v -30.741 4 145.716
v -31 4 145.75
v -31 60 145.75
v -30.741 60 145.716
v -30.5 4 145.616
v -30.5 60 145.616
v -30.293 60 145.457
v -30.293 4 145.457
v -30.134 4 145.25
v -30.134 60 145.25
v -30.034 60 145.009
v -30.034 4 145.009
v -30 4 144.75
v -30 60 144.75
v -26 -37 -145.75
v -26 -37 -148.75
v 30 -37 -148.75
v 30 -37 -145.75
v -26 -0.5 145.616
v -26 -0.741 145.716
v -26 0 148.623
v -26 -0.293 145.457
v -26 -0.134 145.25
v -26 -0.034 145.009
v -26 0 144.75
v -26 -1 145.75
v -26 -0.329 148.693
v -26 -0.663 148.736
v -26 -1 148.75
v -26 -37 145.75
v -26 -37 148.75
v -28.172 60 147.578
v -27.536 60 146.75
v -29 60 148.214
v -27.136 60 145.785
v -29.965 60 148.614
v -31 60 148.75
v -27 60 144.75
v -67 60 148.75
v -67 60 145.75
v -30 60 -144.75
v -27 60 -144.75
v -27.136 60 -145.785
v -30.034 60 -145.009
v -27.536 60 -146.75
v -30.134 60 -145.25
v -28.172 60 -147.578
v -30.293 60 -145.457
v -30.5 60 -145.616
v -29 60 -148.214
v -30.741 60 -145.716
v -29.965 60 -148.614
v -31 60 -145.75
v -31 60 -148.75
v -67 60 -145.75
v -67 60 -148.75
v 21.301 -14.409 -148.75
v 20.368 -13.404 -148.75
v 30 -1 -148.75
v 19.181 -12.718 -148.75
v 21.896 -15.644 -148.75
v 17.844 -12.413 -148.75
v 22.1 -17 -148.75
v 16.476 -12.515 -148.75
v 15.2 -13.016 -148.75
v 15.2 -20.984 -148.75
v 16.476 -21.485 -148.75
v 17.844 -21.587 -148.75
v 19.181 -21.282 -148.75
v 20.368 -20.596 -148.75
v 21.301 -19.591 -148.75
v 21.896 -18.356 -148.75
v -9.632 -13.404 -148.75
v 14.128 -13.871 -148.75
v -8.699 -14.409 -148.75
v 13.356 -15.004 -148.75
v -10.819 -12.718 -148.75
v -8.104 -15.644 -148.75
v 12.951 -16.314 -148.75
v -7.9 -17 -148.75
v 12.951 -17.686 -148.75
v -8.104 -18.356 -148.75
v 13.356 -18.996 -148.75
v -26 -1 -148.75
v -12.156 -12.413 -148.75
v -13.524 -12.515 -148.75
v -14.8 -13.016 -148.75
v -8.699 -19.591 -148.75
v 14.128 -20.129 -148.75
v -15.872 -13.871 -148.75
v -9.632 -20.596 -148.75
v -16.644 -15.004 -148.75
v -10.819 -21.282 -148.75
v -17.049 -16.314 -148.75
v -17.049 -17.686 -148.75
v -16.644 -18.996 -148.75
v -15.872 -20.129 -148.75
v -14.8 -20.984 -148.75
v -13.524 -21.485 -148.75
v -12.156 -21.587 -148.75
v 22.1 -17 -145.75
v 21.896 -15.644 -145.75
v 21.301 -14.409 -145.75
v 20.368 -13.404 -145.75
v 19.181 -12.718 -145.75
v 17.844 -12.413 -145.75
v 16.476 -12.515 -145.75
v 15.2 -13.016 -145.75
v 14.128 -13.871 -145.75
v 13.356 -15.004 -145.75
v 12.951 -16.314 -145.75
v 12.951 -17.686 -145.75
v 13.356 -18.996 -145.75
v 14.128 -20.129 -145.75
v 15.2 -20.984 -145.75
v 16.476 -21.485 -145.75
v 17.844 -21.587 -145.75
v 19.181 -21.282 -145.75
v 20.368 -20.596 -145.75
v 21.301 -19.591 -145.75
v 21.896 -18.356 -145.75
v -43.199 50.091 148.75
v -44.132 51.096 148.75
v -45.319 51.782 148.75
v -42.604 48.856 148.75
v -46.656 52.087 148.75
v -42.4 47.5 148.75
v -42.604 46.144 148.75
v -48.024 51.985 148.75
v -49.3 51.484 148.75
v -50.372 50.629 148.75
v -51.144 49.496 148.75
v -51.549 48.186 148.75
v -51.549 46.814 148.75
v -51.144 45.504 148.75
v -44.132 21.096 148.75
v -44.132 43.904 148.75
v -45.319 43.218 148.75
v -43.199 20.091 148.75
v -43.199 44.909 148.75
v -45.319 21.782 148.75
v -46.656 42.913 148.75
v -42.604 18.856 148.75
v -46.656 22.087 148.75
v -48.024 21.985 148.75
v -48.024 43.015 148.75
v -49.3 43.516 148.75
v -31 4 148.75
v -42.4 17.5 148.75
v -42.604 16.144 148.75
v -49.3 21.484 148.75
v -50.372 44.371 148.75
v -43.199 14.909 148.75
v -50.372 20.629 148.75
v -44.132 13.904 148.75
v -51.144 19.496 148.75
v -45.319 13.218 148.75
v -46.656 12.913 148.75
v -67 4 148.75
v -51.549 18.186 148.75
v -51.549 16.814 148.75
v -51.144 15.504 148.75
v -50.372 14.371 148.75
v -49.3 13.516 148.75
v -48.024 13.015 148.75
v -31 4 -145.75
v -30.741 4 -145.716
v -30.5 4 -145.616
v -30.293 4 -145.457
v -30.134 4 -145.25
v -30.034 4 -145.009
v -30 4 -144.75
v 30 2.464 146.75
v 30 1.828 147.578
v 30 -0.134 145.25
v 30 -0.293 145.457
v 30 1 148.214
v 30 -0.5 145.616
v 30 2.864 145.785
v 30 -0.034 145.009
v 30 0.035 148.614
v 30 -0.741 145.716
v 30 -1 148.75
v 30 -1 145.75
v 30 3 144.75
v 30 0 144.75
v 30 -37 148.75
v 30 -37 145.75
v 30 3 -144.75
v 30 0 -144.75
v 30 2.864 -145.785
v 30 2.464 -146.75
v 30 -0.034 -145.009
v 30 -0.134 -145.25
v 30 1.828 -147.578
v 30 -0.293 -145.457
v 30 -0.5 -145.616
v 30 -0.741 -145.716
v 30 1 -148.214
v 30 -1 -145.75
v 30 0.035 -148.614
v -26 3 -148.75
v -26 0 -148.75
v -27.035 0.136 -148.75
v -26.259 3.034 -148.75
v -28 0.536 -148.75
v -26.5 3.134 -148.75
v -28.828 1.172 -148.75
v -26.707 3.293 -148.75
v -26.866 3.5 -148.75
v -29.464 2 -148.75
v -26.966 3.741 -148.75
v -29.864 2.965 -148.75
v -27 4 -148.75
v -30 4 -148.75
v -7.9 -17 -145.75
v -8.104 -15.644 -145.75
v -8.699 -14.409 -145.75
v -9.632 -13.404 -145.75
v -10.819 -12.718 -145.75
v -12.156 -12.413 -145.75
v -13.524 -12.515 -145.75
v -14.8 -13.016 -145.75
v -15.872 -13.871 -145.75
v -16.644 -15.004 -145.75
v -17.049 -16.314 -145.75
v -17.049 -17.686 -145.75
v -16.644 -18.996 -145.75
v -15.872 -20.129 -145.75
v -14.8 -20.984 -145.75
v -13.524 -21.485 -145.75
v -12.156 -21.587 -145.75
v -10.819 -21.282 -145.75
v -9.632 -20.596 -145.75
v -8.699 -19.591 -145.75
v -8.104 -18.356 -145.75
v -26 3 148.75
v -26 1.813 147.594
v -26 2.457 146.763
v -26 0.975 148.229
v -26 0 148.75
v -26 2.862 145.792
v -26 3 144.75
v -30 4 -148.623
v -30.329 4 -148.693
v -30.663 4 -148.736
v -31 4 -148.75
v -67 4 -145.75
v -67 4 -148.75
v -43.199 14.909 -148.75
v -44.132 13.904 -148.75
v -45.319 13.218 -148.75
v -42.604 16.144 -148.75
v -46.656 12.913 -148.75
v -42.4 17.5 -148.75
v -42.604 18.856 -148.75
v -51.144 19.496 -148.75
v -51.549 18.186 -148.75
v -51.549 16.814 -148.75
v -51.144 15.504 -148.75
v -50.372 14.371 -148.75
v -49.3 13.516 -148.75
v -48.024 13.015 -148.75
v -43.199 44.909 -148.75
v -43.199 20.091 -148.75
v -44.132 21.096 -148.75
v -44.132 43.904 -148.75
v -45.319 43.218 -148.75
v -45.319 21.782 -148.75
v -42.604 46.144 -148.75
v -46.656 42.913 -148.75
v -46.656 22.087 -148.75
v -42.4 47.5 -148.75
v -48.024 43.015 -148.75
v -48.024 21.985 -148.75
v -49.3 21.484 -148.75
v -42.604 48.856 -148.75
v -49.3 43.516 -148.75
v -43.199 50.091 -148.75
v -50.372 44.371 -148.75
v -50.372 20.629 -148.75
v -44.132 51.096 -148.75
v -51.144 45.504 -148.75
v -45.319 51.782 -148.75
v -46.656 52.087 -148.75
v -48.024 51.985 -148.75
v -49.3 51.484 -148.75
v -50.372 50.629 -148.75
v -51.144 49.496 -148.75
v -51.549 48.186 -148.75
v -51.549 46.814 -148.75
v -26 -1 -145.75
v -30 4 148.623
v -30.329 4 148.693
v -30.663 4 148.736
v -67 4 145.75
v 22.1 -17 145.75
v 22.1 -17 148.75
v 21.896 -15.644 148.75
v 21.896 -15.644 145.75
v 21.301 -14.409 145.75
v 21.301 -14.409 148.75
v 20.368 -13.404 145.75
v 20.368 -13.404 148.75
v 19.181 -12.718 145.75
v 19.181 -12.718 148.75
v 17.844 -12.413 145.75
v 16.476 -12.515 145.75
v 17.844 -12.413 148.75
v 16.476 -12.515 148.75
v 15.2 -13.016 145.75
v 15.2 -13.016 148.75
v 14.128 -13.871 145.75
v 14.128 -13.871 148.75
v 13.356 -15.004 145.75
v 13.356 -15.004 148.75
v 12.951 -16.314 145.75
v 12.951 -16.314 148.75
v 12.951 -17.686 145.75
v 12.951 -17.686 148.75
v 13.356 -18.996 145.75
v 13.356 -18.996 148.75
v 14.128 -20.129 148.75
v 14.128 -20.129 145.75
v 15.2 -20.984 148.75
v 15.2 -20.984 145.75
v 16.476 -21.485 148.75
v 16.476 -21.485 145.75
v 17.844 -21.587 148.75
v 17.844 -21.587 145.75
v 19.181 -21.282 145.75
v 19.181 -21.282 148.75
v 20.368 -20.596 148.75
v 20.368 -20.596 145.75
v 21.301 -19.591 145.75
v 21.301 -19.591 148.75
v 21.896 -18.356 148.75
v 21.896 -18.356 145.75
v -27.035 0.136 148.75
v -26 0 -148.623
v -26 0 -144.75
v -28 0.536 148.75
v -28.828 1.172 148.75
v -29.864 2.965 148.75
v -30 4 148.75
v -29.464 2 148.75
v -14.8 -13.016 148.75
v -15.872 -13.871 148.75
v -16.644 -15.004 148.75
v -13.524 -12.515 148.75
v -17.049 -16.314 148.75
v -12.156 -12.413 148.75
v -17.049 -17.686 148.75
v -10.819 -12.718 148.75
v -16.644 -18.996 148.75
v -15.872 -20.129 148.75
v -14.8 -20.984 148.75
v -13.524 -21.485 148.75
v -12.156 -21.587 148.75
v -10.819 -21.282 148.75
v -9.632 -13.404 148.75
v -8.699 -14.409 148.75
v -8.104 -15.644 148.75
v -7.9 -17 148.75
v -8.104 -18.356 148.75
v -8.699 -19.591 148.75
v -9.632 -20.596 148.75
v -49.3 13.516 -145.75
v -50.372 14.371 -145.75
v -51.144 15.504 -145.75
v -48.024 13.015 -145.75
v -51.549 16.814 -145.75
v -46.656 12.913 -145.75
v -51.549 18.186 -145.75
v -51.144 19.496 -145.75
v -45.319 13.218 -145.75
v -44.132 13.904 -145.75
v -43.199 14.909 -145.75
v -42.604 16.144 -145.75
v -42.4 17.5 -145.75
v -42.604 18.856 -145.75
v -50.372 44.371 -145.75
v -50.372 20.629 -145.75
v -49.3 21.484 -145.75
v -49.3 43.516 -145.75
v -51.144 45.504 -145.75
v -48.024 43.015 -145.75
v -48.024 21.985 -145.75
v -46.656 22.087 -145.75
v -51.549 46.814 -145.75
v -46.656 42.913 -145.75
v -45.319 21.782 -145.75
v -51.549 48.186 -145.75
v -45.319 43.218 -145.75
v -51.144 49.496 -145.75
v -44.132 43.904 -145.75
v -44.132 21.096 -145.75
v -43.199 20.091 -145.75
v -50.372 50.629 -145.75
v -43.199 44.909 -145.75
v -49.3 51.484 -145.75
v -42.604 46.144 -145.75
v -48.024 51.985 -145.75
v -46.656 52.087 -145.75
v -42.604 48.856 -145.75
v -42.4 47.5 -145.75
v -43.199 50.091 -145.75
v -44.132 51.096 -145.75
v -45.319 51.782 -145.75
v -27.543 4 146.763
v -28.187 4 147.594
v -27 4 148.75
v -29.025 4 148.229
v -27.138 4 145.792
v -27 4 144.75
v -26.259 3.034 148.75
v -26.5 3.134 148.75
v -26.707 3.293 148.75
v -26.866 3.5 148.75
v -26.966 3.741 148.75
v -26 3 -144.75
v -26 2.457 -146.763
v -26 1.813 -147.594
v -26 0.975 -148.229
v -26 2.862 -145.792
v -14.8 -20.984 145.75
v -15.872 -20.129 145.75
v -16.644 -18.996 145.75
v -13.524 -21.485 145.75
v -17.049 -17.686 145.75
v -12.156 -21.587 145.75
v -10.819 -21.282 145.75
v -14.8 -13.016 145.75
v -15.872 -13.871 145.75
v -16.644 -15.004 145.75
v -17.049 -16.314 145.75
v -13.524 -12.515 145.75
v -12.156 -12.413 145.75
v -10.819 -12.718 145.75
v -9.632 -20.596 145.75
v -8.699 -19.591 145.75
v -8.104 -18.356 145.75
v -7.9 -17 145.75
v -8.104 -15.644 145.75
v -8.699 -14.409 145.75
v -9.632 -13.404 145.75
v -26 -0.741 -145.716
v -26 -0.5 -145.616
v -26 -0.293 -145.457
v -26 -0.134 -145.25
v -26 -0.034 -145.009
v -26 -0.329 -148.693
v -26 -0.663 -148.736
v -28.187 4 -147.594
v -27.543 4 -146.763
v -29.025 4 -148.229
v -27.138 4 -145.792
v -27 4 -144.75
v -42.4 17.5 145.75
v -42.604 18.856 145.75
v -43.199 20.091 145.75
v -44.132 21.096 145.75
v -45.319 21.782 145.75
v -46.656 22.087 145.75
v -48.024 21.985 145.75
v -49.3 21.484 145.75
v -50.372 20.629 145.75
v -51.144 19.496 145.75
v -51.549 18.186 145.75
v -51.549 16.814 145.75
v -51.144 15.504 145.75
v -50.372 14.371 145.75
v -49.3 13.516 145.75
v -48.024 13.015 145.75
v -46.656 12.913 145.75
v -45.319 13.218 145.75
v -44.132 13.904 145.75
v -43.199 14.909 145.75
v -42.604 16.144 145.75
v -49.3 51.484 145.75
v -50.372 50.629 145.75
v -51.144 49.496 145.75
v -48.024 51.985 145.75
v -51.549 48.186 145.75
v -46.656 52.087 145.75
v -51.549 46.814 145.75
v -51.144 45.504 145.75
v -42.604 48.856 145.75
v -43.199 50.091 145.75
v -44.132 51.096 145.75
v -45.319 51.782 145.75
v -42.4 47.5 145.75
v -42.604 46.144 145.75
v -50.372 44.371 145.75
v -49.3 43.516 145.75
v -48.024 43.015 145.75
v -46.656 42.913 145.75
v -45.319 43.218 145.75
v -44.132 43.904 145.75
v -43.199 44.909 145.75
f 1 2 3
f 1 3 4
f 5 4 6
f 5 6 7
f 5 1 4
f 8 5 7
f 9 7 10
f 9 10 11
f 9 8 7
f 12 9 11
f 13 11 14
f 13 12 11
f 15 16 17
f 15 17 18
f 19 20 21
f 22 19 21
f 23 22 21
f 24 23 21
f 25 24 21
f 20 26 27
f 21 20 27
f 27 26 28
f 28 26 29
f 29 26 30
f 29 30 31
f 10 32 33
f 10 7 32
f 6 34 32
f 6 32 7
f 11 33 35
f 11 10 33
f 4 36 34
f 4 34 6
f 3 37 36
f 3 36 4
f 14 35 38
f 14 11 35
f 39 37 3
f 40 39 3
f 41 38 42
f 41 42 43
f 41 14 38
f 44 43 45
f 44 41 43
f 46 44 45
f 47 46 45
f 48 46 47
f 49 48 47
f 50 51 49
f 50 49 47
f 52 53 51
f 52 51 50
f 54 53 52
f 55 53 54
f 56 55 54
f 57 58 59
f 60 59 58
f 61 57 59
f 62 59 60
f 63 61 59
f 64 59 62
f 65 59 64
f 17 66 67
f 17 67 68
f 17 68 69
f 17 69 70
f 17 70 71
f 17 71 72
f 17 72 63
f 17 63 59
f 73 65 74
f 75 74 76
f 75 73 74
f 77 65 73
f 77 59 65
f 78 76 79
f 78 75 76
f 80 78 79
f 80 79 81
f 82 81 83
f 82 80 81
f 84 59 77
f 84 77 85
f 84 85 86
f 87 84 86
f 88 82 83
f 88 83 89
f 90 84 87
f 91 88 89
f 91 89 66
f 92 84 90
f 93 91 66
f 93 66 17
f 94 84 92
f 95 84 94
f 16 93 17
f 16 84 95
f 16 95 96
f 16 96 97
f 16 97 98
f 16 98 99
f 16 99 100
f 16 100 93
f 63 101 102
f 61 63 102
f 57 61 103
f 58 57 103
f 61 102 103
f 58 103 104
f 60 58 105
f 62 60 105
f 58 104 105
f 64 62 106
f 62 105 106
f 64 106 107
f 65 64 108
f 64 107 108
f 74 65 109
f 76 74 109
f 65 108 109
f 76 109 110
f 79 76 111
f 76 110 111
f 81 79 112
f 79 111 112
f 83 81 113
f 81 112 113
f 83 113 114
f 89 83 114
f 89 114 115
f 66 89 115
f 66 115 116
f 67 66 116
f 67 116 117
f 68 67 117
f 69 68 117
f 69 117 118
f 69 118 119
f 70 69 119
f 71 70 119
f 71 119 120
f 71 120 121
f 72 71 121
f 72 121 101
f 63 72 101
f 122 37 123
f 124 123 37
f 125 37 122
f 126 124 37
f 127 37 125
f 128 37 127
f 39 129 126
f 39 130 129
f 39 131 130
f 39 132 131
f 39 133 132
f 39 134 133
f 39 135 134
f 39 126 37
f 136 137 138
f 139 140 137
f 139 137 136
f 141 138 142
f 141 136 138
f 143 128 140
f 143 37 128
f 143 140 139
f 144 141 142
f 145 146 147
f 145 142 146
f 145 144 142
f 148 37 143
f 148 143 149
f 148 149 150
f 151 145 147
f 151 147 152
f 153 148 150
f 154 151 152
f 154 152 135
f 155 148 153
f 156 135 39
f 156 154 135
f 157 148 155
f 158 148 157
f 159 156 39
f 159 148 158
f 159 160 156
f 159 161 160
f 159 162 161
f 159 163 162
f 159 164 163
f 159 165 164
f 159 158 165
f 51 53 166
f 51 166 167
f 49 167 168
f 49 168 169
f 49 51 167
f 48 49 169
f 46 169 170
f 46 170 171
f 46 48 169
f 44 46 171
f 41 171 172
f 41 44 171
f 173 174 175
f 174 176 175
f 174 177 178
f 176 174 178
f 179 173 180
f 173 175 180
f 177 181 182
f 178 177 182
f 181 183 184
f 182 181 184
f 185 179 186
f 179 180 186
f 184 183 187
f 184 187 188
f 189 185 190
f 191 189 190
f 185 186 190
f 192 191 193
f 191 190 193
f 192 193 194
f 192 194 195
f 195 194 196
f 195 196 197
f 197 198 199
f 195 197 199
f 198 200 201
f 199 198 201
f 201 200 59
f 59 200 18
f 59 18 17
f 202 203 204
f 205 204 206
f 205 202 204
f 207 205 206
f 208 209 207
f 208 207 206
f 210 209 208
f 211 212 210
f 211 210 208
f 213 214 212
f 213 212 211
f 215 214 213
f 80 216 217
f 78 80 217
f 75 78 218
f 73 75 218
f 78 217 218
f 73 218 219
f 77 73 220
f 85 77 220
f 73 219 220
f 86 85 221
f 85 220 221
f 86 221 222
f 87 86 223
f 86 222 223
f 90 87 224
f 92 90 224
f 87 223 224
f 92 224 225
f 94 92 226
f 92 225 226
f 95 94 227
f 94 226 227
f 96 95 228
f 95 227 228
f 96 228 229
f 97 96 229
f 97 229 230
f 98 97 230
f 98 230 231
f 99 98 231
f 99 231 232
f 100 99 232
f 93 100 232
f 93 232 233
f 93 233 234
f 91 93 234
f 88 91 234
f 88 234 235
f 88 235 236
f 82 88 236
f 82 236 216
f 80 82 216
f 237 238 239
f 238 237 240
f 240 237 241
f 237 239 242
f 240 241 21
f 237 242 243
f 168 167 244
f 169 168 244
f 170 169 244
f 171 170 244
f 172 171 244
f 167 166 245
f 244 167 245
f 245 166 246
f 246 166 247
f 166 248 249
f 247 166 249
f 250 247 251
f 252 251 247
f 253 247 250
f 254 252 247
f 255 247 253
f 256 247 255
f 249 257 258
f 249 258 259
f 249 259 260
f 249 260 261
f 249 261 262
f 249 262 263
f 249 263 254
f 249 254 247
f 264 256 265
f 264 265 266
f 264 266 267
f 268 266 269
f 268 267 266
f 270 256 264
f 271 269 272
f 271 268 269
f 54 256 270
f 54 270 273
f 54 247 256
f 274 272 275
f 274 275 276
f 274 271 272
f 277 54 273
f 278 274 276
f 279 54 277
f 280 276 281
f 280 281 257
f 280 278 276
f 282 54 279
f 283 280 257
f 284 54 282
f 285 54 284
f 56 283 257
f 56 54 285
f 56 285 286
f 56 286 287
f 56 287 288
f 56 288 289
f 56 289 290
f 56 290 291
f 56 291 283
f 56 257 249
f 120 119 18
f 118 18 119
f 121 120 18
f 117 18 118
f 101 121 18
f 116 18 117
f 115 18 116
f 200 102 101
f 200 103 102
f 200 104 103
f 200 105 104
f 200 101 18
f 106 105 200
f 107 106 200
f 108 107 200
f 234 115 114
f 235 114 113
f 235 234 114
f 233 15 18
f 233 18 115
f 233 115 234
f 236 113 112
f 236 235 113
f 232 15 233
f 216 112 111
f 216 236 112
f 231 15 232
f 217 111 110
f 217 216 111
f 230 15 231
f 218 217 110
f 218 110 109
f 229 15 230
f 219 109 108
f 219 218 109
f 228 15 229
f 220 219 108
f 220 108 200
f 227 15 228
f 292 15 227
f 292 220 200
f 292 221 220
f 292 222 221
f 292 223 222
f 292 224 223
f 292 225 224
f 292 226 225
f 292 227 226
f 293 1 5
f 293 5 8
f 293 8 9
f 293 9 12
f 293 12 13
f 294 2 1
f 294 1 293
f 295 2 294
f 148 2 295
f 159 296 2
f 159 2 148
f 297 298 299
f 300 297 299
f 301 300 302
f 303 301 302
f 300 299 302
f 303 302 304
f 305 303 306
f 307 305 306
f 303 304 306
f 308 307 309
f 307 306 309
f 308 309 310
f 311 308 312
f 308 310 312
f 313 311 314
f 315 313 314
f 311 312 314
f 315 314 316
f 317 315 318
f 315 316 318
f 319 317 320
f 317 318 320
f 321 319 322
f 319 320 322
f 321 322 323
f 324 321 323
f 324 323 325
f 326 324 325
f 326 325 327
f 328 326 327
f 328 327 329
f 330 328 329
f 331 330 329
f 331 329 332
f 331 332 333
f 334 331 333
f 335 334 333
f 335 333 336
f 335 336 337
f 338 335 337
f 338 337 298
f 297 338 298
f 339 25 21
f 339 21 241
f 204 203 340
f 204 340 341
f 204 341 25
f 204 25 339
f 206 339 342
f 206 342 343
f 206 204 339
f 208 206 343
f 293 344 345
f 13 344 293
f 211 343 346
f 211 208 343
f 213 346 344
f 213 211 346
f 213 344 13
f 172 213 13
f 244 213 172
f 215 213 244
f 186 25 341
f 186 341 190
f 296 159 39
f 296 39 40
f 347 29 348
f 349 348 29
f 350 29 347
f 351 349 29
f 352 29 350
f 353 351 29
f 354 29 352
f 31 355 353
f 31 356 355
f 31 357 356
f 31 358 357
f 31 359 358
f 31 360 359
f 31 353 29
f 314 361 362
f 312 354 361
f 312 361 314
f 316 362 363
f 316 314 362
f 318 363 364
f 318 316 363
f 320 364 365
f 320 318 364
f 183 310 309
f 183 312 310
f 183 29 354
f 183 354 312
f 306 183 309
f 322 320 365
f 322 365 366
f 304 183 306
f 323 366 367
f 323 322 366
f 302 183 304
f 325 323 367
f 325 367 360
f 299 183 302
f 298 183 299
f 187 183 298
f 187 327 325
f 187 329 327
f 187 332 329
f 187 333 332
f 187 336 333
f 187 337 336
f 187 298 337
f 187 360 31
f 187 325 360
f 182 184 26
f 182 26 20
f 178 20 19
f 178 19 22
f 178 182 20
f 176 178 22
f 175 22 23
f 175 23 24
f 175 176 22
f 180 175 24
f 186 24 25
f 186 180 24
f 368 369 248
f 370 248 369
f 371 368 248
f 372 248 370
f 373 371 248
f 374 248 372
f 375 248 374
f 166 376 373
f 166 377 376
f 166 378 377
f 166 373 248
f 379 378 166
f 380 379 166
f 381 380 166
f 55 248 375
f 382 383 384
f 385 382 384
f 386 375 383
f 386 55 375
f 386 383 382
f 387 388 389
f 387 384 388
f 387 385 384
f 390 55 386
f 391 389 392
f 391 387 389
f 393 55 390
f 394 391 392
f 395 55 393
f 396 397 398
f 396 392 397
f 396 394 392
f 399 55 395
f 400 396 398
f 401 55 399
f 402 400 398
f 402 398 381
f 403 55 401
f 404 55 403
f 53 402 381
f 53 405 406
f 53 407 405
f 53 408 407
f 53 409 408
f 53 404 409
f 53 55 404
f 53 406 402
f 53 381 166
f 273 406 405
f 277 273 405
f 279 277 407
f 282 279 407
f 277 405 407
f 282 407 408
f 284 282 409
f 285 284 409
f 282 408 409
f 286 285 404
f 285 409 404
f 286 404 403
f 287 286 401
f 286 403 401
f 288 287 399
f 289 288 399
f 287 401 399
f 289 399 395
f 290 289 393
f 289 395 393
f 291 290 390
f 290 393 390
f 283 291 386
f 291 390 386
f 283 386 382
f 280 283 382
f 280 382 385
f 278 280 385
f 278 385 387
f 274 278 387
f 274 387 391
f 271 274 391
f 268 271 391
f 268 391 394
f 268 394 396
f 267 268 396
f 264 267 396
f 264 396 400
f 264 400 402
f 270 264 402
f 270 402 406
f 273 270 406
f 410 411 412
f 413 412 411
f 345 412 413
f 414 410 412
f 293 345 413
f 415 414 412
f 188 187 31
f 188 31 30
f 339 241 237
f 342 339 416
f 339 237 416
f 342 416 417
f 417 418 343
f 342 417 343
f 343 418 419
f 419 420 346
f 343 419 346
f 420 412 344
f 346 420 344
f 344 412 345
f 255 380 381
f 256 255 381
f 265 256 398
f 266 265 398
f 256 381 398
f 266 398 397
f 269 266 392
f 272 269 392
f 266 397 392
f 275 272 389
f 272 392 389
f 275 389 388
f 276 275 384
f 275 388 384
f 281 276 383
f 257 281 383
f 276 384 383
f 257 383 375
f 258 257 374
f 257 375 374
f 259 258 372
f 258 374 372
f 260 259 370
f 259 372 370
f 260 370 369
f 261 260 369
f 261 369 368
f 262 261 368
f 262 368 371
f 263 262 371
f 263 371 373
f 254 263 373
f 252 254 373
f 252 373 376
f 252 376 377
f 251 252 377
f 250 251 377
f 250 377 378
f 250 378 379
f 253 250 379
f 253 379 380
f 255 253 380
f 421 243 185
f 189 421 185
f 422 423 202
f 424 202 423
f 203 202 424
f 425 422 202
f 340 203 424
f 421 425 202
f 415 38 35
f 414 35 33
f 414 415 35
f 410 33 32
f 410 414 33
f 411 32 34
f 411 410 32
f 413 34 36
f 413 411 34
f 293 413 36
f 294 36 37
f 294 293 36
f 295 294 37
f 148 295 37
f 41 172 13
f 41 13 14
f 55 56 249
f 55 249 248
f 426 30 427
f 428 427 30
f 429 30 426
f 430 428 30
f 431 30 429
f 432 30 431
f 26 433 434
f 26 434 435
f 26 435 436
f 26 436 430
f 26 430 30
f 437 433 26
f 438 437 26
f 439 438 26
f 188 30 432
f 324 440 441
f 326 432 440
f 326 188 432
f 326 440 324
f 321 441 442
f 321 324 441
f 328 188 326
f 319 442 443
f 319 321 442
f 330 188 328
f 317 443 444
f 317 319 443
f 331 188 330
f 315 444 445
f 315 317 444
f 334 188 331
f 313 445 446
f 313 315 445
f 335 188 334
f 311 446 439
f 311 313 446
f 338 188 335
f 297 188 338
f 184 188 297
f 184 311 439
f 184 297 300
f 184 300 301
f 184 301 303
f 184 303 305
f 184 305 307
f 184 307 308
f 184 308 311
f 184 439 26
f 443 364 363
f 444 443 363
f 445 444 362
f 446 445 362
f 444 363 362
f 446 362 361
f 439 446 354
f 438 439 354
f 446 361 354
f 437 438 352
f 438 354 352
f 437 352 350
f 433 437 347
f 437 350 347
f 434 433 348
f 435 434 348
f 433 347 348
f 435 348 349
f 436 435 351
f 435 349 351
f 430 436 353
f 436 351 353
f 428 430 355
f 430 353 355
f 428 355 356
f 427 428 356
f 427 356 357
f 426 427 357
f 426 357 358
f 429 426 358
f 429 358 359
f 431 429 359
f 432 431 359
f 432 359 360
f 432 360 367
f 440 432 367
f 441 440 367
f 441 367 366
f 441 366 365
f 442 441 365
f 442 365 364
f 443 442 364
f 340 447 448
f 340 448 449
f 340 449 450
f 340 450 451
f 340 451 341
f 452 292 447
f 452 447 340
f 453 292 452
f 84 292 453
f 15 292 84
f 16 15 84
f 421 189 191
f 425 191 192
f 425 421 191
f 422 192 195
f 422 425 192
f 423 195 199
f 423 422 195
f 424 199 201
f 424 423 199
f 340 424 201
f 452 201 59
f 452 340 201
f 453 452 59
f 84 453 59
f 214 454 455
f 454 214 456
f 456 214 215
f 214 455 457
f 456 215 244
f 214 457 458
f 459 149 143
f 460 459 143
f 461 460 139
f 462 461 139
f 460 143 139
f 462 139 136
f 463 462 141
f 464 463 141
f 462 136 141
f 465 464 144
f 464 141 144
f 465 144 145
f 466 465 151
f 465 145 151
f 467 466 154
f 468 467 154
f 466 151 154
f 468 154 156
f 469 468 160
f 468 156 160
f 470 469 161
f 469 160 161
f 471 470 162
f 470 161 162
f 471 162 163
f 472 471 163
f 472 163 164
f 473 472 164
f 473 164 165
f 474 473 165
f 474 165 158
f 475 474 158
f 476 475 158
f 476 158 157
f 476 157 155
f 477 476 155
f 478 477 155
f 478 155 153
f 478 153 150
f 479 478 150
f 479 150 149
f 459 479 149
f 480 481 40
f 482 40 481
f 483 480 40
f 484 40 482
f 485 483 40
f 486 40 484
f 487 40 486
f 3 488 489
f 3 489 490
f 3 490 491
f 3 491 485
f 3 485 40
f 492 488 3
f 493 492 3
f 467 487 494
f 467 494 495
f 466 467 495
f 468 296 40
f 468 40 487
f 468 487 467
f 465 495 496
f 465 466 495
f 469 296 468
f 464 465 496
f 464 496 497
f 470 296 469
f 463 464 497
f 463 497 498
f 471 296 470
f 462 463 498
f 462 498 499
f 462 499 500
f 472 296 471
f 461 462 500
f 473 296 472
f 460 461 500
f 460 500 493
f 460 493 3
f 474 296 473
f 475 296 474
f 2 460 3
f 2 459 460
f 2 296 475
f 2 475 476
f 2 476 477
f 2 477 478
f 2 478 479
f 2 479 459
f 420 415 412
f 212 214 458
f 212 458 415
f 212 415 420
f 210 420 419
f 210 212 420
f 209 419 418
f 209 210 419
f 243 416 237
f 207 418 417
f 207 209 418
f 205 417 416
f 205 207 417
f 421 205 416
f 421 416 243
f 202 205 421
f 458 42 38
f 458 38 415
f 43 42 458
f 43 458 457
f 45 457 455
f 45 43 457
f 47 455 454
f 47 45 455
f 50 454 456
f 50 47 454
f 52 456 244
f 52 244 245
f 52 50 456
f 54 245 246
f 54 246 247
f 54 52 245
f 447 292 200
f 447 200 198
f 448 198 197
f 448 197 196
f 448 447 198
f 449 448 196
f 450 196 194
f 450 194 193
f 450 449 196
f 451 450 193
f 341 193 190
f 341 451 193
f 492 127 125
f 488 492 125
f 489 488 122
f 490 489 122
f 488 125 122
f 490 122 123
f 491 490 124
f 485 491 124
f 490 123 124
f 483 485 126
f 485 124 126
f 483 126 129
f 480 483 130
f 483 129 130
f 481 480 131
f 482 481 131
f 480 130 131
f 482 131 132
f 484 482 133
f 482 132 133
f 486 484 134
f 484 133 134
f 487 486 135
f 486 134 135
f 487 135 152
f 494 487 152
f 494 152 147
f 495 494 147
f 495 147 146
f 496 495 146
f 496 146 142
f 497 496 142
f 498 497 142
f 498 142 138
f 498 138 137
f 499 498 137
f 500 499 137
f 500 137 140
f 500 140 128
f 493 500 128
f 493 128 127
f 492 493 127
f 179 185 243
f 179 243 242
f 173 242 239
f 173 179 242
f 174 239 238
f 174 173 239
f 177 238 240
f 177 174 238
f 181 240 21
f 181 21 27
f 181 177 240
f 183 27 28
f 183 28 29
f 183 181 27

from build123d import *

# Parameters (mm, degrees)
SKETCH1_W                      = 60
SKETCH1_H                      = 297.5
BASE_FLANGE1_DEPTH             = 3
EDGE_FLANGE1_STRIP_W           = 14
EDGE_FLANGE1_STRIP_H           = 3
EDGE_FLANGE1_STRIP_CUT_DEPTH   = 297.5
EDGE_FLANGE1_DEPTH             = 297.5
EDGE_FLANGE2_STRIP_W           = 14
EDGE_FLANGE2_STRIP_H           = 3
EDGE_FLANGE2_STRIP_CUT_DEPTH   = 56
EDGE_FLANGE2_STRIP_2_W         = 14
EDGE_FLANGE2_STRIP_2_H         = 3
EDGE_FLANGE2_STRIP_CUT_2_DEPTH = 56
EDGE_FLANGE2_STRIP_3_W         = 14
EDGE_FLANGE2_STRIP_3_H         = 3
EDGE_FLANGE2_STRIP_CUT_3_DEPTH = 56
EDGE_FLANGE2_STRIP_4_W         = 14
EDGE_FLANGE2_STRIP_4_H         = 3
EDGE_FLANGE2_STRIP_CUT_4_DEPTH = 56
EDGE_FLANGE2_DEPTH             = 56
EDGE_FLANGE2_BEND_DEPTH        = 56
EDGE_FLANGE2_BEND_2_DEPTH      = 56
EDGE_FLANGE2_BEND_3_DEPTH      = 56
SKETCH18_R                     = 4.6
EXTRUDE1_DEPTH                 = 311.797763827


# Sheet-metal steps are written as plain solids
with BuildPart() as part:
    # Sketch1 → Base-Flange1 (new body)
    with BuildSketch(Plane(origin=(0, 0, 0), x_dir=(1, 0, 0), z_dir=(0, 1, 0))):
        Rectangle(SKETCH1_W, SKETCH1_H)
    extrude(amount=BASE_FLANGE1_DEPTH)

    # Edge-Flange1 strip (across the edge) → Edge-Flange1 strip cut (cut)
    with BuildSketch(Plane(origin=(-30, 3, -148.75), x_dir=(1, 0, 0), z_dir=(0, 0, 1))):
        with Locations((-3, -1.5)):
            Rectangle(EDGE_FLANGE1_STRIP_W, EDGE_FLANGE1_STRIP_H)
    extrude(amount=EDGE_FLANGE1_STRIP_CUT_DEPTH, mode=Mode.SUBTRACT)

    # Edge-Flange1 section (across the edge) → Edge-Flange1 (add)
    with BuildSketch(Plane(origin=(-30, 3, -148.75), x_dir=(1, 0, 0), z_dir=(0, 0, 1))):
        with BuildLine():
            Line((0, 1), (0, 57))
            Line((0, 57), (3, 57))
            Line((3, 57), (3, 1))
            ThreePointArc((3, 1), (3.292893219, 0.292893219), (4, 0))
            Line((4, 0), (4, -3))
            ThreePointArc((4, -3), (1.171572875, -1.828427125), (0, 1))
        make_face()
    extrude(amount=EDGE_FLANGE1_DEPTH)

    # Edge-Flange2 strip (across the edge) → Edge-Flange2 strip cut (cut)
    with BuildSketch(Plane(origin=(-30, 4, 148.75), x_dir=(0, 0, -1), z_dir=(0, 1, 0))):
        with Locations((-3, -1.5)):
            Rectangle(EDGE_FLANGE2_STRIP_W, EDGE_FLANGE2_STRIP_H)
    extrude(amount=EDGE_FLANGE2_STRIP_CUT_DEPTH, mode=Mode.SUBTRACT)

    # Edge-Flange2 strip 2 (across the edge) → Edge-Flange2 strip cut 2 (cut)
    with BuildSketch(Plane(origin=(30, 0, 148.75), x_dir=(0, 0, -1), z_dir=(-1, 0, 0))):
        with Locations((-3, -1.5)):
            Rectangle(EDGE_FLANGE2_STRIP_2_W, EDGE_FLANGE2_STRIP_2_H)
    extrude(amount=EDGE_FLANGE2_STRIP_CUT_2_DEPTH, mode=Mode.SUBTRACT)

    # Edge-Flange2 strip 3 (across the edge) → Edge-Flange2 strip cut 3 (cut)
    with BuildSketch(Plane(origin=(-30, 60, -148.75), x_dir=(0, 0, 1), z_dir=(0, -1, 0))):
        with Locations((-3, -1.5)):
            Rectangle(EDGE_FLANGE2_STRIP_3_W, EDGE_FLANGE2_STRIP_3_H)
    extrude(amount=EDGE_FLANGE2_STRIP_CUT_3_DEPTH, mode=Mode.SUBTRACT)

    # Edge-Flange2 strip 4 (across the edge) → Edge-Flange2 strip cut 4 (cut)
    with BuildSketch(Plane(origin=(-26, 0, -148.75), x_dir=(0, 0, 1), z_dir=(1, 0, 0))):
        with Locations((-3, -1.5)):
            Rectangle(EDGE_FLANGE2_STRIP_4_W, EDGE_FLANGE2_STRIP_4_H)
    extrude(amount=EDGE_FLANGE2_STRIP_CUT_4_DEPTH, mode=Mode.SUBTRACT)

    # Edge-Flange2 section (across the edge) → Edge-Flange2 (add)
    with BuildSketch(Plane(origin=(-30, 4, 148.75), x_dir=(0, 0, -1), z_dir=(0, 1, 0))):
        with BuildLine():
            Line((0, 1), (0, 37))
            Line((0, 37), (3, 37))
            Line((3, 37), (3, 1))
            ThreePointArc((3, 1), (3.292893219, 0.292893219), (4, 0))
            Line((4, 0), (4, -3))
            ThreePointArc((4, -3), (1.171572875, -1.828427125), (0, 1))
        make_face()
    extrude(amount=EDGE_FLANGE2_DEPTH)

    # Edge-Flange2 section 2 (across the edge) → Edge-Flange2 bend (add)
    with BuildSketch(Plane(origin=(30, 0, 148.75), x_dir=(0, 0, -1), z_dir=(-1, 0, 0))):
        with BuildLine():
            Line((0, 1), (0, 37))
            Line((0, 37), (3, 37))
            Line((3, 37), (3, 1))
            ThreePointArc((3, 1), (3.292893219, 0.292893219), (4, 0))
            Line((4, 0), (4, -3))
            ThreePointArc((4, -3), (1.171572875, -1.828427125), (0, 1))
        make_face()
    extrude(amount=EDGE_FLANGE2_BEND_DEPTH)

    # Edge-Flange2 section 3 (across the edge) → Edge-Flange2 bend 2 (add)
    with BuildSketch(Plane(origin=(-30, 60, -148.75), x_dir=(0, 0, 1), z_dir=(0, -1, 0))):
        with BuildLine():
            Line((0, 1), (0, 37))
            Line((0, 37), (3, 37))
            Line((3, 37), (3, 1))
            ThreePointArc((3, 1), (3.292893219, 0.292893219), (4, 0))
            Line((4, 0), (4, -3))
            ThreePointArc((4, -3), (1.171572875, -1.828427125), (0, 1))
        make_face()
    extrude(amount=EDGE_FLANGE2_BEND_2_DEPTH)

    # Edge-Flange2 section 4 (across the edge) → Edge-Flange2 bend 3 (add)
    with BuildSketch(Plane(origin=(-26, 0, -148.75), x_dir=(0, 0, 1), z_dir=(1, 0, 0))):
        with BuildLine():
            Line((0, 1), (0, 37))
            Line((0, 37), (3, 37))
            Line((3, 37), (3, 1))
            ThreePointArc((3, 1), (3.292893219, 0.292893219), (4, 0))
            Line((4, 0), (4, -3))
            ThreePointArc((4, -3), (1.171572875, -1.828427125), (0, 1))
        make_face()
    extrude(amount=EDGE_FLANGE2_BEND_3_DEPTH)

    # Sketch18 → Extrude1 (cut, through all)
    with BuildSketch(Plane.XY.offset(148.75)):
        with Locations((-47, 47.5)):
            Circle(SKETCH18_R)
        with Locations((-47, 17.5)):
            Circle(SKETCH18_R)
        with Locations((-12.5, -17)):
            Circle(SKETCH18_R)
        with Locations((17.5, -17)):
            Circle(SKETCH18_R)
    extrude(amount=-EXTRUDE1_DEPTH, mode=Mode.SUBTRACT)


solid = part.part
